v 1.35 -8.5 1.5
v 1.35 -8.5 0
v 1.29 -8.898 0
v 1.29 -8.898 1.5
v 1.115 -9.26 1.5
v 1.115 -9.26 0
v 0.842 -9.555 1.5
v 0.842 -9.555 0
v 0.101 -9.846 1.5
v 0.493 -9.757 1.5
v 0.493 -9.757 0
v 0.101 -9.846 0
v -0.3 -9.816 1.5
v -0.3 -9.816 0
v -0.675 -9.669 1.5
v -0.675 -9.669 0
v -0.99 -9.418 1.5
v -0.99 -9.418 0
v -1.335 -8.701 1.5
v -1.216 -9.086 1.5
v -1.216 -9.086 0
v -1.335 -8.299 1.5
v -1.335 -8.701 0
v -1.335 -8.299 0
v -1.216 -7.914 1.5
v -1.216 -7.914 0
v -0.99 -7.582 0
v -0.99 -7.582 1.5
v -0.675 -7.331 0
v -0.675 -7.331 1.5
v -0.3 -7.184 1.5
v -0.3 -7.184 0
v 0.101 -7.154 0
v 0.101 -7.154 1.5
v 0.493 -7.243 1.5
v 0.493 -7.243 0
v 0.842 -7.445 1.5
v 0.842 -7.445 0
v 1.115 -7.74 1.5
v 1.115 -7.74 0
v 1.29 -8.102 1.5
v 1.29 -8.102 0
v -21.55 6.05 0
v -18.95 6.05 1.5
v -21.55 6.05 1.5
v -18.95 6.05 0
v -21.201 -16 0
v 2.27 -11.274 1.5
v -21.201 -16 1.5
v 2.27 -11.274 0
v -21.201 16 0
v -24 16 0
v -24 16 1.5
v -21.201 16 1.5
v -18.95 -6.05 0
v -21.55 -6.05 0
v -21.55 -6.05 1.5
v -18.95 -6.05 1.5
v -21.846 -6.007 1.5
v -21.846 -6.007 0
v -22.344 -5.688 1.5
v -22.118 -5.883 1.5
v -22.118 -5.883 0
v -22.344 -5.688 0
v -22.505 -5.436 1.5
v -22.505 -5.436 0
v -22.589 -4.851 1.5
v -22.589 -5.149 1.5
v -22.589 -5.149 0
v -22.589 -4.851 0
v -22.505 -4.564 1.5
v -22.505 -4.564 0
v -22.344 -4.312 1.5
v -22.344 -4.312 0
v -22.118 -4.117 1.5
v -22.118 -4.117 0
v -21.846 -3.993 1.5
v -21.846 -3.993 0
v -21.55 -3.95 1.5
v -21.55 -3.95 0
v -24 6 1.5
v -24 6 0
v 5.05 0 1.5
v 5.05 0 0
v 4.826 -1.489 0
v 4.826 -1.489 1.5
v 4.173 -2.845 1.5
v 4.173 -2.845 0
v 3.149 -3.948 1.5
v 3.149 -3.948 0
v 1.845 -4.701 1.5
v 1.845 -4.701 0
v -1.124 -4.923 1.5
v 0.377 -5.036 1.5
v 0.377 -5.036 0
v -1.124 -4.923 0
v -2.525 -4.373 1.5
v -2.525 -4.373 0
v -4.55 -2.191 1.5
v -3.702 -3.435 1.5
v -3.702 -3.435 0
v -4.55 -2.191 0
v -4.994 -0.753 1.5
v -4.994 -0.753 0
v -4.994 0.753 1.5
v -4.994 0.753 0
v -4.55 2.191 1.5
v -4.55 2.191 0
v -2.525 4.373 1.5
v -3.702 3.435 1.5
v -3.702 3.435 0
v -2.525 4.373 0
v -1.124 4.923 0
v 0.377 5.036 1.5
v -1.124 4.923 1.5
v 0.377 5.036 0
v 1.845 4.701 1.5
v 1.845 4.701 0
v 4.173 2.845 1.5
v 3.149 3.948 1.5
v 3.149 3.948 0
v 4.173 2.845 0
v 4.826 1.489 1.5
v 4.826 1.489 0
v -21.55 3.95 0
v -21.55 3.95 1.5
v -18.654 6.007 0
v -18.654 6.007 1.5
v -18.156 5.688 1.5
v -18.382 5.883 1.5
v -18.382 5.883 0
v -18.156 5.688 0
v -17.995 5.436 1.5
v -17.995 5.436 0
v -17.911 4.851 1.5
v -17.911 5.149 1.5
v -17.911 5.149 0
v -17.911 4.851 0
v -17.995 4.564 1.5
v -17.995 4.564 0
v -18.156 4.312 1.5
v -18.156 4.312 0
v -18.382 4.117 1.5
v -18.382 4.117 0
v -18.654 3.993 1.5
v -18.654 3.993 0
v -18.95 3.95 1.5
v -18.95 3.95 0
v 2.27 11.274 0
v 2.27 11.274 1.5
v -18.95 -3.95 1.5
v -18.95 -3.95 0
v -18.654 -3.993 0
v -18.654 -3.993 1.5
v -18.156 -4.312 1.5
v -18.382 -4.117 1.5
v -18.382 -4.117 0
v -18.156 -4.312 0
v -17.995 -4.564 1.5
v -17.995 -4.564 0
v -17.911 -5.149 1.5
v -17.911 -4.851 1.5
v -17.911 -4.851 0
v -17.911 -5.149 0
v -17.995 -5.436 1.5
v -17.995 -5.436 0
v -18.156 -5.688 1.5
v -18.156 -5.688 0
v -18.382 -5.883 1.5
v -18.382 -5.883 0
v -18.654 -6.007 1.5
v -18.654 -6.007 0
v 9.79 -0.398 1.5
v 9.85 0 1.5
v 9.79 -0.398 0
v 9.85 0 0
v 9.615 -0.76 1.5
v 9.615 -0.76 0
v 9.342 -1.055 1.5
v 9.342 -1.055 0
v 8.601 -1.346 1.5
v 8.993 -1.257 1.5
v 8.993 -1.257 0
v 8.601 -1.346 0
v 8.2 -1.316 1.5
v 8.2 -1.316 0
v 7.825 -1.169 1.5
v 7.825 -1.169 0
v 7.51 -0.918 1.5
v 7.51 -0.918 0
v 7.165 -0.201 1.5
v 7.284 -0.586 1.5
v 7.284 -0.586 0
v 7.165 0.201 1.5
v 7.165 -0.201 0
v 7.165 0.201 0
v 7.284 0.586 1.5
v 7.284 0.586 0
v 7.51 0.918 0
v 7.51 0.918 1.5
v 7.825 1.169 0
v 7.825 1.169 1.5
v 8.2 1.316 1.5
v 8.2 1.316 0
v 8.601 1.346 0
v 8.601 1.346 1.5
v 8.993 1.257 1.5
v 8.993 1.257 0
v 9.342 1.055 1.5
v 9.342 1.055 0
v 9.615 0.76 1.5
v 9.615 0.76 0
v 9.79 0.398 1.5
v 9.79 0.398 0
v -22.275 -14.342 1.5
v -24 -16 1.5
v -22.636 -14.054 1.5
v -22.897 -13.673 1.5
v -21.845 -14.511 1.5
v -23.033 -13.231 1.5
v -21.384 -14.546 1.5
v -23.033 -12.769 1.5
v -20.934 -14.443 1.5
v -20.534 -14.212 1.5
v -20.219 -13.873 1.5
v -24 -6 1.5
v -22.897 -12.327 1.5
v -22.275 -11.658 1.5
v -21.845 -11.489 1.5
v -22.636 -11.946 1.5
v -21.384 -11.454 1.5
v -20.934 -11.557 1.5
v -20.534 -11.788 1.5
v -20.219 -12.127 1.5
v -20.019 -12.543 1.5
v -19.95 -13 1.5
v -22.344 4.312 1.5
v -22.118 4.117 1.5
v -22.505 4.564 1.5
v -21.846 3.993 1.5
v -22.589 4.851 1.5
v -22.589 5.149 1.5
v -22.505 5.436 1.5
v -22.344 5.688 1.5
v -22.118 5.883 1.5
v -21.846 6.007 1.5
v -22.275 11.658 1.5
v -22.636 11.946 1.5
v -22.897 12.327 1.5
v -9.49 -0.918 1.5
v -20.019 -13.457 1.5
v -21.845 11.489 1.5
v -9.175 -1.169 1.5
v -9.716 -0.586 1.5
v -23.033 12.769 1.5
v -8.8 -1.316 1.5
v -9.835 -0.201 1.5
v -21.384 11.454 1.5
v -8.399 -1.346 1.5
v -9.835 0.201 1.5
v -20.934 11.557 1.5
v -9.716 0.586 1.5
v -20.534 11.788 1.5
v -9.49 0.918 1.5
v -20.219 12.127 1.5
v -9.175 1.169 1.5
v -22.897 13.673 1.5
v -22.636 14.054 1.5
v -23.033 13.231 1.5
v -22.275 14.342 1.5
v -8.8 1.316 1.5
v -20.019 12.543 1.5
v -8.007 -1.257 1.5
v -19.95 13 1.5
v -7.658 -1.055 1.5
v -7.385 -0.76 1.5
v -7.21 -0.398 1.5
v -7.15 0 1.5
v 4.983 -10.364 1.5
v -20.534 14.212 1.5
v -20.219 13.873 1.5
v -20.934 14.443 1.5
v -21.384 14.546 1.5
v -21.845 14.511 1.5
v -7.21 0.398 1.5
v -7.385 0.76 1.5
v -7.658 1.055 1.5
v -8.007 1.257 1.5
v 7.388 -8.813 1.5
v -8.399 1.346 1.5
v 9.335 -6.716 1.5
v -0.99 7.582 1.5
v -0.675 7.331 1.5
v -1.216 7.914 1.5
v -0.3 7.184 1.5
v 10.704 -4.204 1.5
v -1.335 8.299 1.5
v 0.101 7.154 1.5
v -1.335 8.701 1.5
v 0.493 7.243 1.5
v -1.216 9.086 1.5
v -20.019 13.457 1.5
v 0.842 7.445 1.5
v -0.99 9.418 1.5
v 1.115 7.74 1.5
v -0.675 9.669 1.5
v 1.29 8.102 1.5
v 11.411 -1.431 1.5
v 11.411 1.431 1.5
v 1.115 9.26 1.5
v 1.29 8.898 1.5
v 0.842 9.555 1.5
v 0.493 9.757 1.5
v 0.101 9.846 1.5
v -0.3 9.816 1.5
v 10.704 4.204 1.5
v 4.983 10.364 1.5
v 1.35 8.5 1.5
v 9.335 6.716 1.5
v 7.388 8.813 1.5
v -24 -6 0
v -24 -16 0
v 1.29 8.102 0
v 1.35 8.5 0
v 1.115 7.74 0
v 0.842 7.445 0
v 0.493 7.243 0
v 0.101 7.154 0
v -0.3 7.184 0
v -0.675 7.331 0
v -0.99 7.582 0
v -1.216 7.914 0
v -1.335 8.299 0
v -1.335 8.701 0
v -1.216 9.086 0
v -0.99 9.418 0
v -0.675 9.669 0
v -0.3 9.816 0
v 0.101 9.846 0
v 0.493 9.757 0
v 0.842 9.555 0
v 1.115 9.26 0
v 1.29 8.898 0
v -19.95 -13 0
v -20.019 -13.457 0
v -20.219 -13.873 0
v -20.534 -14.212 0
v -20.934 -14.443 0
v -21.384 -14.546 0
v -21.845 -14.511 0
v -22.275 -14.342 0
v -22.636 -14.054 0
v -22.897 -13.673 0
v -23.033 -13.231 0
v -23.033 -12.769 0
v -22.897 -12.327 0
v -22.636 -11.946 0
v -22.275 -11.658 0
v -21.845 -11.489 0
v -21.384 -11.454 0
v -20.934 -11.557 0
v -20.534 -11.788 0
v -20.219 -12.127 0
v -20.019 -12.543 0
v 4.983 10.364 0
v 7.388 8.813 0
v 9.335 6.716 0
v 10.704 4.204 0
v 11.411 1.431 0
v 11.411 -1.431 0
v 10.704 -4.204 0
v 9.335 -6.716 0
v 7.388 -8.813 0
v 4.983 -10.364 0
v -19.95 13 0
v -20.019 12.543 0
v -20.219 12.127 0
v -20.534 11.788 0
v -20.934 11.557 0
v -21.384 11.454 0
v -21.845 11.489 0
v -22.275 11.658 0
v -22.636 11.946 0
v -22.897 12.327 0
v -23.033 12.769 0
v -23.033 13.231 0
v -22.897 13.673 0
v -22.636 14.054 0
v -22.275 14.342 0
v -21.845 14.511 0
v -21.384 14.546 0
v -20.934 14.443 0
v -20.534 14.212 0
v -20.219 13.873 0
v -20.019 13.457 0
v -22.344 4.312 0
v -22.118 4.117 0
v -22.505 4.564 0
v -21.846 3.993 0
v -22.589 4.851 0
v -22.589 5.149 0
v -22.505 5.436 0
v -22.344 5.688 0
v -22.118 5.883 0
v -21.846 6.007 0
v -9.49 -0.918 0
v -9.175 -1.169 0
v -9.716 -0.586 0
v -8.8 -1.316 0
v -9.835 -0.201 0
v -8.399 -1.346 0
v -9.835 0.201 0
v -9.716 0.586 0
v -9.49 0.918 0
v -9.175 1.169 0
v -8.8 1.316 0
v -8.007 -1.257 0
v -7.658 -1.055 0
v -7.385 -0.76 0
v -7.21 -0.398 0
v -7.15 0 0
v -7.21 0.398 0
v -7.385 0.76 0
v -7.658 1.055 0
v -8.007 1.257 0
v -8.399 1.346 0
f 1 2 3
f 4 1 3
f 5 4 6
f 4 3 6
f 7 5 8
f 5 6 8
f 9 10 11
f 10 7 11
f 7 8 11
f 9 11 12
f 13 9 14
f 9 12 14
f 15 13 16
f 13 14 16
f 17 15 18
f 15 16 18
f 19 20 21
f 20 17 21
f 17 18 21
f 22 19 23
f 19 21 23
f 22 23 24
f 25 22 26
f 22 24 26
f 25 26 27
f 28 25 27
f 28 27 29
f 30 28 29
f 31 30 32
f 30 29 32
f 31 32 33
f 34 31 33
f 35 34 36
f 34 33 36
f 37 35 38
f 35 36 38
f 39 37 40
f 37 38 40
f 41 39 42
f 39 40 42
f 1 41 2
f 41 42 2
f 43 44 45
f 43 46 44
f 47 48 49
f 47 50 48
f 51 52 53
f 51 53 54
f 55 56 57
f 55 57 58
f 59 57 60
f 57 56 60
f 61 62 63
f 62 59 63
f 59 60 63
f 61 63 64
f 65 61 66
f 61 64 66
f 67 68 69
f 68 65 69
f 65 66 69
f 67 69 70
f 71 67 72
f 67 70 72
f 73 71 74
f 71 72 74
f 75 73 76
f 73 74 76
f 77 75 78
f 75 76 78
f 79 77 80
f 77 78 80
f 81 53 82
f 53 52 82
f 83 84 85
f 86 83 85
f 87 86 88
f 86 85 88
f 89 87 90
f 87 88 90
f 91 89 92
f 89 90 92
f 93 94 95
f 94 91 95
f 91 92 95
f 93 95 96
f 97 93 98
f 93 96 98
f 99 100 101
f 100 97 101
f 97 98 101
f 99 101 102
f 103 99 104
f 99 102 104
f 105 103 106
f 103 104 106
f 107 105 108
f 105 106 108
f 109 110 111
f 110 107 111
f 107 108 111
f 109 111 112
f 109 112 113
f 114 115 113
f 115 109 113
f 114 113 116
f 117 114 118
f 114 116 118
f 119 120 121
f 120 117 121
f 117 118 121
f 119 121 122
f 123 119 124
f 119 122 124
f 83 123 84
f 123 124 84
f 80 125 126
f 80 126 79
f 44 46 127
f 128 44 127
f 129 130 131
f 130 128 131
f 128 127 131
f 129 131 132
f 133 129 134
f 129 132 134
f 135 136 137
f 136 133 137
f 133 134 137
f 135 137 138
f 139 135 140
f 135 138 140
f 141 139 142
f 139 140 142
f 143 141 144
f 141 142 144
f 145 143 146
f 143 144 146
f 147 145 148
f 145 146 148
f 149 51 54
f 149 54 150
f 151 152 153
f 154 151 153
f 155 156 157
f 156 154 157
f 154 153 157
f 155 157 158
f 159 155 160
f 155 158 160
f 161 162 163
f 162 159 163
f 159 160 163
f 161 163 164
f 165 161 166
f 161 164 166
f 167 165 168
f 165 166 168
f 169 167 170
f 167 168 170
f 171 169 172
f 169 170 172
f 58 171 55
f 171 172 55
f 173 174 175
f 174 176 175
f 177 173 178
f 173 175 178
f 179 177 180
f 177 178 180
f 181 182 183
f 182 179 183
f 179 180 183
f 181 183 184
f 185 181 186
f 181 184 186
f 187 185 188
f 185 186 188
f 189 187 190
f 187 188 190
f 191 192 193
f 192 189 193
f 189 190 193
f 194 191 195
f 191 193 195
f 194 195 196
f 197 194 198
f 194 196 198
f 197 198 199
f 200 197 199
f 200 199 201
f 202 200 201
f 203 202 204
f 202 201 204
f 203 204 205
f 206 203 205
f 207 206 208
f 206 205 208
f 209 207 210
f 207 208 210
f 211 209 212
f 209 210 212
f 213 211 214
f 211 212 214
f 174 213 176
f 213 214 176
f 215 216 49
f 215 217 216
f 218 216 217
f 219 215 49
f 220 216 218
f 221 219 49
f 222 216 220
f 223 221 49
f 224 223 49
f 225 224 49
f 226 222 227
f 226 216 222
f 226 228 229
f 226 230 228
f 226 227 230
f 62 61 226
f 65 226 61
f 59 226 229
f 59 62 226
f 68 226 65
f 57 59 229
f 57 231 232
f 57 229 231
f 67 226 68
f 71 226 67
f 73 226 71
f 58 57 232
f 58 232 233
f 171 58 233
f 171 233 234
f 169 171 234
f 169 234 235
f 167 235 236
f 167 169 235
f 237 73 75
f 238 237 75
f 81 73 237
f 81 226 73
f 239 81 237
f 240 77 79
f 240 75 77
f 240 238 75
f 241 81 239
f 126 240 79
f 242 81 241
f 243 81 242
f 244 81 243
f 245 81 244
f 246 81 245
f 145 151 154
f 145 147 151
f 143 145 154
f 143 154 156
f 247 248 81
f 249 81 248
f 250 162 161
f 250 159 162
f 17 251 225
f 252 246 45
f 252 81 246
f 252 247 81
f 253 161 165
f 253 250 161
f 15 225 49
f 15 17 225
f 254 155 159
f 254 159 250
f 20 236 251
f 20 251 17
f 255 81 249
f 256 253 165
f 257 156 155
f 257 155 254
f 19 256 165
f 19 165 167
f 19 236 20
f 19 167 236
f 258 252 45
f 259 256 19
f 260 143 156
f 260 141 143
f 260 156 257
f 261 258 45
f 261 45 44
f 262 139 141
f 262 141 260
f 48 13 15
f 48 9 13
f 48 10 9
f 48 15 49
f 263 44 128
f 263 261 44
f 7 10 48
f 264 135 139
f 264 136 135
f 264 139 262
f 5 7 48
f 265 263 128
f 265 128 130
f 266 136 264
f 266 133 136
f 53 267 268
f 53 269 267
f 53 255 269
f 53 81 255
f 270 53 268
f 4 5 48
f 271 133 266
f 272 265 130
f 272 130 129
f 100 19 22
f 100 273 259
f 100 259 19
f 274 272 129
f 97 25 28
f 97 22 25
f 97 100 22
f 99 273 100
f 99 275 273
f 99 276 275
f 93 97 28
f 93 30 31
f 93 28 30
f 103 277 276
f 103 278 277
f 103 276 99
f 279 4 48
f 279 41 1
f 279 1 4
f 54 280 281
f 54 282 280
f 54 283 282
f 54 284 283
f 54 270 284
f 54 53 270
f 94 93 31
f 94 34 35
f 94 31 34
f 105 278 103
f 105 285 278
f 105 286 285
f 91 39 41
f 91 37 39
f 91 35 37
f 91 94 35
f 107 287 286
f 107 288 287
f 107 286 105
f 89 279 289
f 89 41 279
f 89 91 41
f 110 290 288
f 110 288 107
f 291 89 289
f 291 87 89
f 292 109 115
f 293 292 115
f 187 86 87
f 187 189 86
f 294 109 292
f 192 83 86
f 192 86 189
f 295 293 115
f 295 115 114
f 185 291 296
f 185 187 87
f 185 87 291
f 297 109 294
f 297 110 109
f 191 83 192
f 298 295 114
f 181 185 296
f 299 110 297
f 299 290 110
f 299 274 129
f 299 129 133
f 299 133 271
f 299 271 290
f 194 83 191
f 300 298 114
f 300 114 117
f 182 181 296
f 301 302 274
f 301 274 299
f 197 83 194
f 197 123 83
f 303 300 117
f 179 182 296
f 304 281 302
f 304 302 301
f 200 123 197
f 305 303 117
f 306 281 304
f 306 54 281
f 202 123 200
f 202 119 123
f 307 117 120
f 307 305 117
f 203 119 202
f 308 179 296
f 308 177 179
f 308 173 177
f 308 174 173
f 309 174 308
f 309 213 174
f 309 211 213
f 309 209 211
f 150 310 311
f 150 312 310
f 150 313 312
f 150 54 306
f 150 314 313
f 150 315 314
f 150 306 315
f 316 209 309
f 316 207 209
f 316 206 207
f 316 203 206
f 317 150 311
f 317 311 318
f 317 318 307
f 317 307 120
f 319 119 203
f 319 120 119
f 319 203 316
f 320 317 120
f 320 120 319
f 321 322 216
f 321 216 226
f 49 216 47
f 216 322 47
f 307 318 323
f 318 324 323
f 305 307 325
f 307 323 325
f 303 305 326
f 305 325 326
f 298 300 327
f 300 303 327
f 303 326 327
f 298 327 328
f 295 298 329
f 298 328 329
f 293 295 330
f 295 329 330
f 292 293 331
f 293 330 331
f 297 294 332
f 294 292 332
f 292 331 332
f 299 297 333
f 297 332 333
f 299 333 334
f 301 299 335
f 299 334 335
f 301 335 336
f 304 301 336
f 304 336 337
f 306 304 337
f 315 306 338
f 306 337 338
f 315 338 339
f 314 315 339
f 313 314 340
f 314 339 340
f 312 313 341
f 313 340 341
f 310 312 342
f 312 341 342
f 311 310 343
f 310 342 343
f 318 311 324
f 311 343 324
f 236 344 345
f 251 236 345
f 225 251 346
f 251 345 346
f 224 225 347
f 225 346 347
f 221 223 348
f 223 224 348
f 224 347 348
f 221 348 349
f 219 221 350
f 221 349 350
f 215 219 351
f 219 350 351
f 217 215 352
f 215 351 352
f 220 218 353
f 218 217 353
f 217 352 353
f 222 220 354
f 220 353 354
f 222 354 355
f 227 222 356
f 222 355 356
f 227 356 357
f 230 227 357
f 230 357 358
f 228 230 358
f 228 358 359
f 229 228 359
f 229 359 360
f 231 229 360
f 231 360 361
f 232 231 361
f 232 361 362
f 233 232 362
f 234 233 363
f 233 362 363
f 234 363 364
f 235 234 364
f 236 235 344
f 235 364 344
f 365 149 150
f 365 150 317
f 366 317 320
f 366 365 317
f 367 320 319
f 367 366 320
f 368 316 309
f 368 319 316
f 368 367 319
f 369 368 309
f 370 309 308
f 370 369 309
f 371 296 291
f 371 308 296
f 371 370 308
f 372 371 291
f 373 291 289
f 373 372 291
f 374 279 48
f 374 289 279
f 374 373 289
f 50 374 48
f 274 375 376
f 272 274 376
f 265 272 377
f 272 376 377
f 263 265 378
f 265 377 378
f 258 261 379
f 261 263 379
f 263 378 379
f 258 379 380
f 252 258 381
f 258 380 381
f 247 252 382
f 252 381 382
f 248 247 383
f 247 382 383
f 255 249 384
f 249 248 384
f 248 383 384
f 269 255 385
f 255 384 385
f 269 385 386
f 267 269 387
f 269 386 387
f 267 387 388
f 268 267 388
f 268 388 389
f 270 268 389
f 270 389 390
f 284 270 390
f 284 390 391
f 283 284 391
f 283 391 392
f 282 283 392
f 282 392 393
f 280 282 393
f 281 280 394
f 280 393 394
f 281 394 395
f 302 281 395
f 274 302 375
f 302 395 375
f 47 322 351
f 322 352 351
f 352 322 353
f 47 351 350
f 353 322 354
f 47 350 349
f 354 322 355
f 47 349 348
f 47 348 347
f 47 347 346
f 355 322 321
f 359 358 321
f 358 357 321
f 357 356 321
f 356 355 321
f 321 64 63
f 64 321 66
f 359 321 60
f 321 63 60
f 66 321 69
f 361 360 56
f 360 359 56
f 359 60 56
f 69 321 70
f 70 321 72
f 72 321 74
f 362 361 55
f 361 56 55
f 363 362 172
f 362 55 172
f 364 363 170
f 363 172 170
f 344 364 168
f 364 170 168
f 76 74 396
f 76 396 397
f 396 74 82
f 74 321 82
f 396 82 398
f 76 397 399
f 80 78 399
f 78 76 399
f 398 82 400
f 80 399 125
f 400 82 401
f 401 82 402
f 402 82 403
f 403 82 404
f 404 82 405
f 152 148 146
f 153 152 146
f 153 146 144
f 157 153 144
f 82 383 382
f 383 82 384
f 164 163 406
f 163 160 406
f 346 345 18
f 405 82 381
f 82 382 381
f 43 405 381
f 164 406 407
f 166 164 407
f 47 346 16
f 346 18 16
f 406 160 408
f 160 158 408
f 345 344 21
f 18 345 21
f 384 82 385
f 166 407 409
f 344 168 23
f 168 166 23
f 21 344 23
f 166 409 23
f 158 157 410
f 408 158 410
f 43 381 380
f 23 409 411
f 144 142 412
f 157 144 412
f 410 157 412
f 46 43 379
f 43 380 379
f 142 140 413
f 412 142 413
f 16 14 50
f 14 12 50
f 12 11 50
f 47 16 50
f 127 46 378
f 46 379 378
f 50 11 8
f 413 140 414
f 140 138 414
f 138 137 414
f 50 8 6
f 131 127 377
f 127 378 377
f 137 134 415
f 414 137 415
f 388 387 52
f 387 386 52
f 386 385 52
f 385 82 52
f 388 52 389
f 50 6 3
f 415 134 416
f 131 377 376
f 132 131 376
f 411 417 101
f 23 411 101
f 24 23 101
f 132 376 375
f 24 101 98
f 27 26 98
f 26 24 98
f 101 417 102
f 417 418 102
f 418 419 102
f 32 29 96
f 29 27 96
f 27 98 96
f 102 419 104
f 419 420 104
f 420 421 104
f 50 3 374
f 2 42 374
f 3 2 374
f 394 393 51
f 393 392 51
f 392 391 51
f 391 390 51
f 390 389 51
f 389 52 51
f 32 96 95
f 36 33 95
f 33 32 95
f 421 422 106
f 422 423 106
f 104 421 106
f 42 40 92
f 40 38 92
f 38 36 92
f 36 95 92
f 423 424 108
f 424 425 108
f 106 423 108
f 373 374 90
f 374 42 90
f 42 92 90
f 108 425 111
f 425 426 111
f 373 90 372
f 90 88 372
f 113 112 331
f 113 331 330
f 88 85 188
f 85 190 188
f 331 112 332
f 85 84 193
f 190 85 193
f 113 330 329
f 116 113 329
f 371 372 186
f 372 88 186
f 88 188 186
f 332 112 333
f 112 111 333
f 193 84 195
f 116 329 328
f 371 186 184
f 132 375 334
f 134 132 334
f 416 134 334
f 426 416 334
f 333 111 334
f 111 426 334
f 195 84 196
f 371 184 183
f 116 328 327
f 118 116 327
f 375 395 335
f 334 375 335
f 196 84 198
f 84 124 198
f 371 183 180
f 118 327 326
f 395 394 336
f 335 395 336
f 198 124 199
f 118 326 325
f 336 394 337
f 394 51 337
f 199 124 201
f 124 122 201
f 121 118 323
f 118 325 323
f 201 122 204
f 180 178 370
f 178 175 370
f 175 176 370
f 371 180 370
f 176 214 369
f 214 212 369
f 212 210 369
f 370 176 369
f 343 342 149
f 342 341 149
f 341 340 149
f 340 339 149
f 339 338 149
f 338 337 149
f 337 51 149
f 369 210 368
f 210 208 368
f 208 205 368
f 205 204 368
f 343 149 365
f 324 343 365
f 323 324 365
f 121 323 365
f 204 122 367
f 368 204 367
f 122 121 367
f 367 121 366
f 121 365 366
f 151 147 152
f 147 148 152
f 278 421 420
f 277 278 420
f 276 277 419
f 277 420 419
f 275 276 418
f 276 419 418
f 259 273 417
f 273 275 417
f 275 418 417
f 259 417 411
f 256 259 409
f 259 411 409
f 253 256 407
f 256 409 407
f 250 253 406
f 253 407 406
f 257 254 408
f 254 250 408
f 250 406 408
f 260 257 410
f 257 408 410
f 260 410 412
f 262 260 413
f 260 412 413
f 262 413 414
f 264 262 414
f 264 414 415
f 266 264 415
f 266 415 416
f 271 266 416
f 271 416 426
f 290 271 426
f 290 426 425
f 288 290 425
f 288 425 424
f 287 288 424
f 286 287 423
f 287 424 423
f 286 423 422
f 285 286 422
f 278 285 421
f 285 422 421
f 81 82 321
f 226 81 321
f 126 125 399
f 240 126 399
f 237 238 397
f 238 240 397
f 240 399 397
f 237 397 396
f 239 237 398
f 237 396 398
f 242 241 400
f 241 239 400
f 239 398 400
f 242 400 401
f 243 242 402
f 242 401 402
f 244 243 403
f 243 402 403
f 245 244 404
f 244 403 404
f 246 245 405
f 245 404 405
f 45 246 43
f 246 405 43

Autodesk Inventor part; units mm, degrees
ref_plane "YZ Plane" through (0, 0, 0) normal (1, 0, 0) x (0, 1, 0)
ref_plane "XZ Plane" through (0, 0, 0) normal (0, 1, 0) x (-1, 0, 0)
ref_plane "XY Plane" through (0, 0, 0) normal (0, 0, 1) x (1, 0, 0)
sketch "スケッチ1" plane through (0, 0, 0) normal (0, 0, 1) x (1, 0, 0)
  circle A0 centre (0, 0) radius 10.5 construction
  line L0 (-12, 10.583) -> (-12, -10.583) construction
  arc A1 (0, 16) -> (-12, 10.583) centre (0, 0) ccw construction
  line L1 (0, 16) -> (33.5167, 16) construction
  line L2 (33.5167, 16) -> (33.5167, -16) construction
  line L3 (33.5167, -16) -> (0, -16) construction
  arc A2 (-12, -10.583) -> (0, -16) centre (0, 0) ccw construction
  circle A3 centre (0, 8.5) radius 1.35
  circle A4 centre (-8.5, 0) radius 1.35
  circle A5 centre (0, -8.5) radius 1.35
  circle A6 centre (8.5, 0) radius 1.35
  circle A7 centre (0, 0) radius 5.05
  circle A8 centre (0, 0) radius 16 construction
  line L4 (-21.5, 6) -> (-19, 6) construction
  line L5 (-19, 6) -> (-19, -6) construction
  line L6 (-19, -6) -> (-21.5, -6) construction
  line L7 (-21.5, -6) -> (-21.5, 6) construction
  circle A9 centre (0, 0) radius 19 construction
  line L8 (-18.95, 6.05) -> (-21.55, 6.05) construction
  line L9 (-21.55, 6.05) -> (-21.55, -6.05) construction
  line L10 (-21.55, -6.05) -> (-18.95, -6.05) construction
  line L11 (-18.95, -6.05) -> (-18.95, 6.05) construction
  circle A10 centre (-21.55, 5) radius 1.05 construction
  line L12 (-18.95, 6.05) -> (-21.55, 6.05)
  arc A11 (-21.55, 6.05) -> (-21.55, 3.95) centre (-21.55, 5) ccw
  line L13 (-21.55, 3.95) -> (-21.55, -3.95)
  line L14 (-20.25, 6.05) -> (-20.25, -6.05) construction
  line L15 (-21.55, 0) -> (-19, 0) construction
  arc A12 (-21.55, -3.95) -> (-21.55, -6.05) centre (-21.55, -5) ccw
  line L16 (-21.55, -6.05) -> (-18.95, -6.05)
  line L17 (-18.95, 3.95) -> (-18.95, -3.95)
  arc A13 (-18.95, 3.95) -> (-18.95, 6.05) centre (-18.95, 5) ccw
  arc A14 (-18.95, -6.05) -> (-18.95, -3.95) centre (-18.95, -5) ccw
  line L18 (-24, 6) -> (-24, -6)
  circle A15 centre (-21.5, 13) radius 1.55
  circle A16 centre (-21.5, -13) radius 1.55
  line L19 (-24, 16) -> (-21.201, 16)
  line L20 (-24, -16) -> (-21.201, -16)
  arc A17 (2.2701, -11.2737) -> (2.2701, 11.2737) centre (0, 0) ccw
  line L21 (-24, 16) -> (-24, 6)
  circle A18 centre (-21.5, 13) radius 3 construction
  line L22 (-24, -16) -> (-24, -6)
  line L23 (-21.201, 16) -> (2.2701, 11.2737)
  line L24 (2.2701, -11.2737) -> (-21.201, -16)
  point P0 (-12, 0)
  point P1 (-20.275, 0)
  dimension "d29" = 2.1
  dimension "d0" = 21
  dimension "d1" = 16
  dimension "d2" = 12
  dimension "d3" = 8.5
  dimension "d4" = 2.7
  dimension "d7" = 360
  dimension "d9" = 10.1
  dimension "d10" = 2.5
  dimension "d11" = 3
  dimension "d27" = 10
  dimension "d30" = 0.05
  dimension "d31" = 7
  dimension "d33" = 3.1
  dimension "d41" = 2.5
  dimension "d43" = 1
extrude "押し出し1" add sketch "スケッチ1" along normal blind 1.5
equation "\"d27\" = d21"
equation "\"d31\" = d23"
equation "\"d21\" = 10"
equation "\"d23\" = 7"
properties part number "肩_サブフレーム_1_1" material "アルミニウム 2014-T4"
